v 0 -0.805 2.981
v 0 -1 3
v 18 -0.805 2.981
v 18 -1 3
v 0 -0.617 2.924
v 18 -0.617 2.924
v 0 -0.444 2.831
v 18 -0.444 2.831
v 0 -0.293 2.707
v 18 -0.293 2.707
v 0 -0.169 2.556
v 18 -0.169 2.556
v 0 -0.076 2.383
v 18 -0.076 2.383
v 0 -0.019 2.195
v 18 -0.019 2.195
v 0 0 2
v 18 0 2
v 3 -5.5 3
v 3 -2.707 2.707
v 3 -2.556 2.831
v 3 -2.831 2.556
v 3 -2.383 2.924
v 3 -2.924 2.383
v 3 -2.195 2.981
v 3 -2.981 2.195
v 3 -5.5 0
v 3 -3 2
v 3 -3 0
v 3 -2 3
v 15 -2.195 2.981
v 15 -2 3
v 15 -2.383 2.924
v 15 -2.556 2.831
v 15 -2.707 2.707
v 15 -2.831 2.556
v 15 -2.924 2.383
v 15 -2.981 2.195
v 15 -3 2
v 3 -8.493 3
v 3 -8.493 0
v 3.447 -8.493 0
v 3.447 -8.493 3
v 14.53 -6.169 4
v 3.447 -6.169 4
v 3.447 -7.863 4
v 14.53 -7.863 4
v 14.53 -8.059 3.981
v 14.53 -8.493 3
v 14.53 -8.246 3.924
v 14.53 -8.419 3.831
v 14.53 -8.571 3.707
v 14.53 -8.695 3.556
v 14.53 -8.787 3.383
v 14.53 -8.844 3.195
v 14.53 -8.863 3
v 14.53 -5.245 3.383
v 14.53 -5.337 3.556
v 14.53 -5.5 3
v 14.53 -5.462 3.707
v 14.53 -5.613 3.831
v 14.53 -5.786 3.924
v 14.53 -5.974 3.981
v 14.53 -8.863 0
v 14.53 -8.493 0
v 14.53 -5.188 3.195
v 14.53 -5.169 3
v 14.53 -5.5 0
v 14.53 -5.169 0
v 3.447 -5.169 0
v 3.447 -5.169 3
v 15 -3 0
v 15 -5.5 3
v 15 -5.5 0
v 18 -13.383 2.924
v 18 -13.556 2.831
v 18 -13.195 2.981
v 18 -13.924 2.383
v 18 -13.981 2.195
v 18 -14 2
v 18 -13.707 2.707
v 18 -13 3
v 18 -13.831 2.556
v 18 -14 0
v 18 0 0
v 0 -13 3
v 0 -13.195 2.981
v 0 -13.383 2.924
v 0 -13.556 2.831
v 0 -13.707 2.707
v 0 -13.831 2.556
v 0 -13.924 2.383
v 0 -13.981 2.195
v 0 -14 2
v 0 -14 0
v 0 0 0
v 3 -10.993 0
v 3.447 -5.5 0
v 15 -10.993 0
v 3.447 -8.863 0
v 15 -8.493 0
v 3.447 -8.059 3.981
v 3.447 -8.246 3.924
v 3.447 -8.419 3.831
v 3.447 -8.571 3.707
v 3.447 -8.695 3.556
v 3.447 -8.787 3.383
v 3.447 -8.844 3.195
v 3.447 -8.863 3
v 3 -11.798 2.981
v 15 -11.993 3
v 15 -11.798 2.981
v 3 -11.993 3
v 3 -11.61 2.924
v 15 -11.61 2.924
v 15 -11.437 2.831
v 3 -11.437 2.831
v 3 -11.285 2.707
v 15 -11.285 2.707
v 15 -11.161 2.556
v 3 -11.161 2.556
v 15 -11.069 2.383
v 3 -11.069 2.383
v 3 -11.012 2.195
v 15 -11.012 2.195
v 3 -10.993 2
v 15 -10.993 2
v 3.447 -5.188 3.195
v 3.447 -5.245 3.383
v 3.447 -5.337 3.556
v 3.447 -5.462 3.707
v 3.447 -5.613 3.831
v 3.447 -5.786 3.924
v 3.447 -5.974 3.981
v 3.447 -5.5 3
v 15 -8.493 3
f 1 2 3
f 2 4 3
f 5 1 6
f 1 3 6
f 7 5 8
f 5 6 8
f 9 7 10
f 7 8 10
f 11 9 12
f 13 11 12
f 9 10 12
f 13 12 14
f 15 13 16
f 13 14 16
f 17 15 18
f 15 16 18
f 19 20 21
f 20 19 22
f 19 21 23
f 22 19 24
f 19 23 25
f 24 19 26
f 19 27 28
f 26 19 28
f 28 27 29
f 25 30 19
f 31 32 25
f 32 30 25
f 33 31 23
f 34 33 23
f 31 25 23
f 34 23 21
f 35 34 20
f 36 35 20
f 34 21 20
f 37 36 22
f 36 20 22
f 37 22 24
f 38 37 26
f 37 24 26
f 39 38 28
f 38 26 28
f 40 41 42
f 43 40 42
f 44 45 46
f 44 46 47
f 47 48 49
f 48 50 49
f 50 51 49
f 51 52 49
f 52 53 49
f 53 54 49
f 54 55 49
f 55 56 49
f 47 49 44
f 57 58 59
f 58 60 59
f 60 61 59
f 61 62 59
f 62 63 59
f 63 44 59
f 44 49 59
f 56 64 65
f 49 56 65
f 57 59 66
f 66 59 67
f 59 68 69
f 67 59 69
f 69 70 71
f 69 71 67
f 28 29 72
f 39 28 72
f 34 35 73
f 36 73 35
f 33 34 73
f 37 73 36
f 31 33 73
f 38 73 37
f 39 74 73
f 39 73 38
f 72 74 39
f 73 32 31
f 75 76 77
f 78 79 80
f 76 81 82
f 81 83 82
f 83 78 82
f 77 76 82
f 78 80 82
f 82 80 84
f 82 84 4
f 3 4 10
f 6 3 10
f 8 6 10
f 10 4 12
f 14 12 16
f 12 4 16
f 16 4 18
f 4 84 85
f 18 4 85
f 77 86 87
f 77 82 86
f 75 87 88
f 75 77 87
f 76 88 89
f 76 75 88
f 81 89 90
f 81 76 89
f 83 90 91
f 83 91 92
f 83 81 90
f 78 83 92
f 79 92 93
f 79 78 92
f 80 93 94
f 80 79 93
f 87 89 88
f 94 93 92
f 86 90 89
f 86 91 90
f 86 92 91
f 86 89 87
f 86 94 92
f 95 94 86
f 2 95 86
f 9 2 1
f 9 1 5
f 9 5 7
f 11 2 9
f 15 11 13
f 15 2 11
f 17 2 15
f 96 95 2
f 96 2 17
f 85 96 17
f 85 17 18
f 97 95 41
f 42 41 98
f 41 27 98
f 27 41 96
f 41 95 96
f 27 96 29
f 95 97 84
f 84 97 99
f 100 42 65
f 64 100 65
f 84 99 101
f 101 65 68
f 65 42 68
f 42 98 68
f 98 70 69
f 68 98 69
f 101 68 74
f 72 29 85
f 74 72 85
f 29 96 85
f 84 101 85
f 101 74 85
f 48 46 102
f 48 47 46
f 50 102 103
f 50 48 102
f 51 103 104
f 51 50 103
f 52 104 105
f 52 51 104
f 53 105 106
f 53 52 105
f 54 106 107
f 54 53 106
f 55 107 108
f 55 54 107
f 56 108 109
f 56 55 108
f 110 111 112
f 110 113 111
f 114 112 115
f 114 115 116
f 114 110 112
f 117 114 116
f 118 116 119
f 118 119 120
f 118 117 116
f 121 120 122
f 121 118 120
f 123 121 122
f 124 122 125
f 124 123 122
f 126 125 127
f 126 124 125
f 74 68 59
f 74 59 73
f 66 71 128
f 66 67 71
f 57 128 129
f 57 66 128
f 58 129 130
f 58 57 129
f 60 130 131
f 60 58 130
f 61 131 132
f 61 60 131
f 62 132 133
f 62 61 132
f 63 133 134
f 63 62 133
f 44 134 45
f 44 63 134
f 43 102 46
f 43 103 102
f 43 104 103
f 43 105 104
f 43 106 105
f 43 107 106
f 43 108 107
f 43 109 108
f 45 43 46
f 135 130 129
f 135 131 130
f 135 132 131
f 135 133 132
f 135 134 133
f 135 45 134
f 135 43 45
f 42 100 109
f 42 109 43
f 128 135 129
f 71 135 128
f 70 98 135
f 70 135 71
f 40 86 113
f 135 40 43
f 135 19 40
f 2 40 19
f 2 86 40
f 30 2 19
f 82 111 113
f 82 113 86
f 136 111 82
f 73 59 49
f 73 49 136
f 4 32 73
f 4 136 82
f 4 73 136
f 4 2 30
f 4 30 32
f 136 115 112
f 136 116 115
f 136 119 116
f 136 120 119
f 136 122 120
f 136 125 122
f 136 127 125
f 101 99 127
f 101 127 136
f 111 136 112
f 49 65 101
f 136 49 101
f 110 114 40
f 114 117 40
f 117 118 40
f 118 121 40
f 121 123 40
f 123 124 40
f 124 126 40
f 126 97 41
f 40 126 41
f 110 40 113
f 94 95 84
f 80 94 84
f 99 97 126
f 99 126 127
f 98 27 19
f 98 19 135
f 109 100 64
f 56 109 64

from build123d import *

# Parameters (mm, degrees)
F0_W     = 18
F0_H     = 14
F3_DEPTH = 3
F1_W     = 12.000005
F1_H     = 2.5
F4_DEPTH = 25
F2_W     = 11.083636
F2_H     = 3.694546
F5_DEPTH = 4
F6_R     = 1


with BuildPart() as f3:
    # F0 (on Top) → F3 (new body)
    with BuildSketch(Plane.XY):
        with Locations((9, -7)):
            Rectangle(F0_W, F0_H)
    extrude(amount=F3_DEPTH)

    # F1 (on face) → F4 (cut)
    with BuildSketch(Plane.XY):
        with Locations((9.000003, -4.25)):
            Rectangle(F1_W, F1_H)
        with Locations((9.000003, -9.742595)):
            Rectangle(F1_W, F1_H)
    extrude(amount=F4_DEPTH, mode=Mode.SUBTRACT)

    # F2 (on face) → F5 (join)
    with BuildSketch(Plane.XY):
        with Locations((8.988467, -7.016157)):
            Rectangle(F2_W, F2_H)
    extrude(amount=F5_DEPTH)

    # F6
    f6_edges = [f3.edges().sort_by_distance(p)[0] for p in [
        (8.988467, -8.86343, 4),
        (8.988467, -5.168884, 4),
        (9.000002, -3, 3),
        (9.000002, -10.992595, 3),
        (9, -14, 3),
        (9, 0, 3),
    ]]
    fillet(f6_edges, radius=F6_R)


solid = f3.part
